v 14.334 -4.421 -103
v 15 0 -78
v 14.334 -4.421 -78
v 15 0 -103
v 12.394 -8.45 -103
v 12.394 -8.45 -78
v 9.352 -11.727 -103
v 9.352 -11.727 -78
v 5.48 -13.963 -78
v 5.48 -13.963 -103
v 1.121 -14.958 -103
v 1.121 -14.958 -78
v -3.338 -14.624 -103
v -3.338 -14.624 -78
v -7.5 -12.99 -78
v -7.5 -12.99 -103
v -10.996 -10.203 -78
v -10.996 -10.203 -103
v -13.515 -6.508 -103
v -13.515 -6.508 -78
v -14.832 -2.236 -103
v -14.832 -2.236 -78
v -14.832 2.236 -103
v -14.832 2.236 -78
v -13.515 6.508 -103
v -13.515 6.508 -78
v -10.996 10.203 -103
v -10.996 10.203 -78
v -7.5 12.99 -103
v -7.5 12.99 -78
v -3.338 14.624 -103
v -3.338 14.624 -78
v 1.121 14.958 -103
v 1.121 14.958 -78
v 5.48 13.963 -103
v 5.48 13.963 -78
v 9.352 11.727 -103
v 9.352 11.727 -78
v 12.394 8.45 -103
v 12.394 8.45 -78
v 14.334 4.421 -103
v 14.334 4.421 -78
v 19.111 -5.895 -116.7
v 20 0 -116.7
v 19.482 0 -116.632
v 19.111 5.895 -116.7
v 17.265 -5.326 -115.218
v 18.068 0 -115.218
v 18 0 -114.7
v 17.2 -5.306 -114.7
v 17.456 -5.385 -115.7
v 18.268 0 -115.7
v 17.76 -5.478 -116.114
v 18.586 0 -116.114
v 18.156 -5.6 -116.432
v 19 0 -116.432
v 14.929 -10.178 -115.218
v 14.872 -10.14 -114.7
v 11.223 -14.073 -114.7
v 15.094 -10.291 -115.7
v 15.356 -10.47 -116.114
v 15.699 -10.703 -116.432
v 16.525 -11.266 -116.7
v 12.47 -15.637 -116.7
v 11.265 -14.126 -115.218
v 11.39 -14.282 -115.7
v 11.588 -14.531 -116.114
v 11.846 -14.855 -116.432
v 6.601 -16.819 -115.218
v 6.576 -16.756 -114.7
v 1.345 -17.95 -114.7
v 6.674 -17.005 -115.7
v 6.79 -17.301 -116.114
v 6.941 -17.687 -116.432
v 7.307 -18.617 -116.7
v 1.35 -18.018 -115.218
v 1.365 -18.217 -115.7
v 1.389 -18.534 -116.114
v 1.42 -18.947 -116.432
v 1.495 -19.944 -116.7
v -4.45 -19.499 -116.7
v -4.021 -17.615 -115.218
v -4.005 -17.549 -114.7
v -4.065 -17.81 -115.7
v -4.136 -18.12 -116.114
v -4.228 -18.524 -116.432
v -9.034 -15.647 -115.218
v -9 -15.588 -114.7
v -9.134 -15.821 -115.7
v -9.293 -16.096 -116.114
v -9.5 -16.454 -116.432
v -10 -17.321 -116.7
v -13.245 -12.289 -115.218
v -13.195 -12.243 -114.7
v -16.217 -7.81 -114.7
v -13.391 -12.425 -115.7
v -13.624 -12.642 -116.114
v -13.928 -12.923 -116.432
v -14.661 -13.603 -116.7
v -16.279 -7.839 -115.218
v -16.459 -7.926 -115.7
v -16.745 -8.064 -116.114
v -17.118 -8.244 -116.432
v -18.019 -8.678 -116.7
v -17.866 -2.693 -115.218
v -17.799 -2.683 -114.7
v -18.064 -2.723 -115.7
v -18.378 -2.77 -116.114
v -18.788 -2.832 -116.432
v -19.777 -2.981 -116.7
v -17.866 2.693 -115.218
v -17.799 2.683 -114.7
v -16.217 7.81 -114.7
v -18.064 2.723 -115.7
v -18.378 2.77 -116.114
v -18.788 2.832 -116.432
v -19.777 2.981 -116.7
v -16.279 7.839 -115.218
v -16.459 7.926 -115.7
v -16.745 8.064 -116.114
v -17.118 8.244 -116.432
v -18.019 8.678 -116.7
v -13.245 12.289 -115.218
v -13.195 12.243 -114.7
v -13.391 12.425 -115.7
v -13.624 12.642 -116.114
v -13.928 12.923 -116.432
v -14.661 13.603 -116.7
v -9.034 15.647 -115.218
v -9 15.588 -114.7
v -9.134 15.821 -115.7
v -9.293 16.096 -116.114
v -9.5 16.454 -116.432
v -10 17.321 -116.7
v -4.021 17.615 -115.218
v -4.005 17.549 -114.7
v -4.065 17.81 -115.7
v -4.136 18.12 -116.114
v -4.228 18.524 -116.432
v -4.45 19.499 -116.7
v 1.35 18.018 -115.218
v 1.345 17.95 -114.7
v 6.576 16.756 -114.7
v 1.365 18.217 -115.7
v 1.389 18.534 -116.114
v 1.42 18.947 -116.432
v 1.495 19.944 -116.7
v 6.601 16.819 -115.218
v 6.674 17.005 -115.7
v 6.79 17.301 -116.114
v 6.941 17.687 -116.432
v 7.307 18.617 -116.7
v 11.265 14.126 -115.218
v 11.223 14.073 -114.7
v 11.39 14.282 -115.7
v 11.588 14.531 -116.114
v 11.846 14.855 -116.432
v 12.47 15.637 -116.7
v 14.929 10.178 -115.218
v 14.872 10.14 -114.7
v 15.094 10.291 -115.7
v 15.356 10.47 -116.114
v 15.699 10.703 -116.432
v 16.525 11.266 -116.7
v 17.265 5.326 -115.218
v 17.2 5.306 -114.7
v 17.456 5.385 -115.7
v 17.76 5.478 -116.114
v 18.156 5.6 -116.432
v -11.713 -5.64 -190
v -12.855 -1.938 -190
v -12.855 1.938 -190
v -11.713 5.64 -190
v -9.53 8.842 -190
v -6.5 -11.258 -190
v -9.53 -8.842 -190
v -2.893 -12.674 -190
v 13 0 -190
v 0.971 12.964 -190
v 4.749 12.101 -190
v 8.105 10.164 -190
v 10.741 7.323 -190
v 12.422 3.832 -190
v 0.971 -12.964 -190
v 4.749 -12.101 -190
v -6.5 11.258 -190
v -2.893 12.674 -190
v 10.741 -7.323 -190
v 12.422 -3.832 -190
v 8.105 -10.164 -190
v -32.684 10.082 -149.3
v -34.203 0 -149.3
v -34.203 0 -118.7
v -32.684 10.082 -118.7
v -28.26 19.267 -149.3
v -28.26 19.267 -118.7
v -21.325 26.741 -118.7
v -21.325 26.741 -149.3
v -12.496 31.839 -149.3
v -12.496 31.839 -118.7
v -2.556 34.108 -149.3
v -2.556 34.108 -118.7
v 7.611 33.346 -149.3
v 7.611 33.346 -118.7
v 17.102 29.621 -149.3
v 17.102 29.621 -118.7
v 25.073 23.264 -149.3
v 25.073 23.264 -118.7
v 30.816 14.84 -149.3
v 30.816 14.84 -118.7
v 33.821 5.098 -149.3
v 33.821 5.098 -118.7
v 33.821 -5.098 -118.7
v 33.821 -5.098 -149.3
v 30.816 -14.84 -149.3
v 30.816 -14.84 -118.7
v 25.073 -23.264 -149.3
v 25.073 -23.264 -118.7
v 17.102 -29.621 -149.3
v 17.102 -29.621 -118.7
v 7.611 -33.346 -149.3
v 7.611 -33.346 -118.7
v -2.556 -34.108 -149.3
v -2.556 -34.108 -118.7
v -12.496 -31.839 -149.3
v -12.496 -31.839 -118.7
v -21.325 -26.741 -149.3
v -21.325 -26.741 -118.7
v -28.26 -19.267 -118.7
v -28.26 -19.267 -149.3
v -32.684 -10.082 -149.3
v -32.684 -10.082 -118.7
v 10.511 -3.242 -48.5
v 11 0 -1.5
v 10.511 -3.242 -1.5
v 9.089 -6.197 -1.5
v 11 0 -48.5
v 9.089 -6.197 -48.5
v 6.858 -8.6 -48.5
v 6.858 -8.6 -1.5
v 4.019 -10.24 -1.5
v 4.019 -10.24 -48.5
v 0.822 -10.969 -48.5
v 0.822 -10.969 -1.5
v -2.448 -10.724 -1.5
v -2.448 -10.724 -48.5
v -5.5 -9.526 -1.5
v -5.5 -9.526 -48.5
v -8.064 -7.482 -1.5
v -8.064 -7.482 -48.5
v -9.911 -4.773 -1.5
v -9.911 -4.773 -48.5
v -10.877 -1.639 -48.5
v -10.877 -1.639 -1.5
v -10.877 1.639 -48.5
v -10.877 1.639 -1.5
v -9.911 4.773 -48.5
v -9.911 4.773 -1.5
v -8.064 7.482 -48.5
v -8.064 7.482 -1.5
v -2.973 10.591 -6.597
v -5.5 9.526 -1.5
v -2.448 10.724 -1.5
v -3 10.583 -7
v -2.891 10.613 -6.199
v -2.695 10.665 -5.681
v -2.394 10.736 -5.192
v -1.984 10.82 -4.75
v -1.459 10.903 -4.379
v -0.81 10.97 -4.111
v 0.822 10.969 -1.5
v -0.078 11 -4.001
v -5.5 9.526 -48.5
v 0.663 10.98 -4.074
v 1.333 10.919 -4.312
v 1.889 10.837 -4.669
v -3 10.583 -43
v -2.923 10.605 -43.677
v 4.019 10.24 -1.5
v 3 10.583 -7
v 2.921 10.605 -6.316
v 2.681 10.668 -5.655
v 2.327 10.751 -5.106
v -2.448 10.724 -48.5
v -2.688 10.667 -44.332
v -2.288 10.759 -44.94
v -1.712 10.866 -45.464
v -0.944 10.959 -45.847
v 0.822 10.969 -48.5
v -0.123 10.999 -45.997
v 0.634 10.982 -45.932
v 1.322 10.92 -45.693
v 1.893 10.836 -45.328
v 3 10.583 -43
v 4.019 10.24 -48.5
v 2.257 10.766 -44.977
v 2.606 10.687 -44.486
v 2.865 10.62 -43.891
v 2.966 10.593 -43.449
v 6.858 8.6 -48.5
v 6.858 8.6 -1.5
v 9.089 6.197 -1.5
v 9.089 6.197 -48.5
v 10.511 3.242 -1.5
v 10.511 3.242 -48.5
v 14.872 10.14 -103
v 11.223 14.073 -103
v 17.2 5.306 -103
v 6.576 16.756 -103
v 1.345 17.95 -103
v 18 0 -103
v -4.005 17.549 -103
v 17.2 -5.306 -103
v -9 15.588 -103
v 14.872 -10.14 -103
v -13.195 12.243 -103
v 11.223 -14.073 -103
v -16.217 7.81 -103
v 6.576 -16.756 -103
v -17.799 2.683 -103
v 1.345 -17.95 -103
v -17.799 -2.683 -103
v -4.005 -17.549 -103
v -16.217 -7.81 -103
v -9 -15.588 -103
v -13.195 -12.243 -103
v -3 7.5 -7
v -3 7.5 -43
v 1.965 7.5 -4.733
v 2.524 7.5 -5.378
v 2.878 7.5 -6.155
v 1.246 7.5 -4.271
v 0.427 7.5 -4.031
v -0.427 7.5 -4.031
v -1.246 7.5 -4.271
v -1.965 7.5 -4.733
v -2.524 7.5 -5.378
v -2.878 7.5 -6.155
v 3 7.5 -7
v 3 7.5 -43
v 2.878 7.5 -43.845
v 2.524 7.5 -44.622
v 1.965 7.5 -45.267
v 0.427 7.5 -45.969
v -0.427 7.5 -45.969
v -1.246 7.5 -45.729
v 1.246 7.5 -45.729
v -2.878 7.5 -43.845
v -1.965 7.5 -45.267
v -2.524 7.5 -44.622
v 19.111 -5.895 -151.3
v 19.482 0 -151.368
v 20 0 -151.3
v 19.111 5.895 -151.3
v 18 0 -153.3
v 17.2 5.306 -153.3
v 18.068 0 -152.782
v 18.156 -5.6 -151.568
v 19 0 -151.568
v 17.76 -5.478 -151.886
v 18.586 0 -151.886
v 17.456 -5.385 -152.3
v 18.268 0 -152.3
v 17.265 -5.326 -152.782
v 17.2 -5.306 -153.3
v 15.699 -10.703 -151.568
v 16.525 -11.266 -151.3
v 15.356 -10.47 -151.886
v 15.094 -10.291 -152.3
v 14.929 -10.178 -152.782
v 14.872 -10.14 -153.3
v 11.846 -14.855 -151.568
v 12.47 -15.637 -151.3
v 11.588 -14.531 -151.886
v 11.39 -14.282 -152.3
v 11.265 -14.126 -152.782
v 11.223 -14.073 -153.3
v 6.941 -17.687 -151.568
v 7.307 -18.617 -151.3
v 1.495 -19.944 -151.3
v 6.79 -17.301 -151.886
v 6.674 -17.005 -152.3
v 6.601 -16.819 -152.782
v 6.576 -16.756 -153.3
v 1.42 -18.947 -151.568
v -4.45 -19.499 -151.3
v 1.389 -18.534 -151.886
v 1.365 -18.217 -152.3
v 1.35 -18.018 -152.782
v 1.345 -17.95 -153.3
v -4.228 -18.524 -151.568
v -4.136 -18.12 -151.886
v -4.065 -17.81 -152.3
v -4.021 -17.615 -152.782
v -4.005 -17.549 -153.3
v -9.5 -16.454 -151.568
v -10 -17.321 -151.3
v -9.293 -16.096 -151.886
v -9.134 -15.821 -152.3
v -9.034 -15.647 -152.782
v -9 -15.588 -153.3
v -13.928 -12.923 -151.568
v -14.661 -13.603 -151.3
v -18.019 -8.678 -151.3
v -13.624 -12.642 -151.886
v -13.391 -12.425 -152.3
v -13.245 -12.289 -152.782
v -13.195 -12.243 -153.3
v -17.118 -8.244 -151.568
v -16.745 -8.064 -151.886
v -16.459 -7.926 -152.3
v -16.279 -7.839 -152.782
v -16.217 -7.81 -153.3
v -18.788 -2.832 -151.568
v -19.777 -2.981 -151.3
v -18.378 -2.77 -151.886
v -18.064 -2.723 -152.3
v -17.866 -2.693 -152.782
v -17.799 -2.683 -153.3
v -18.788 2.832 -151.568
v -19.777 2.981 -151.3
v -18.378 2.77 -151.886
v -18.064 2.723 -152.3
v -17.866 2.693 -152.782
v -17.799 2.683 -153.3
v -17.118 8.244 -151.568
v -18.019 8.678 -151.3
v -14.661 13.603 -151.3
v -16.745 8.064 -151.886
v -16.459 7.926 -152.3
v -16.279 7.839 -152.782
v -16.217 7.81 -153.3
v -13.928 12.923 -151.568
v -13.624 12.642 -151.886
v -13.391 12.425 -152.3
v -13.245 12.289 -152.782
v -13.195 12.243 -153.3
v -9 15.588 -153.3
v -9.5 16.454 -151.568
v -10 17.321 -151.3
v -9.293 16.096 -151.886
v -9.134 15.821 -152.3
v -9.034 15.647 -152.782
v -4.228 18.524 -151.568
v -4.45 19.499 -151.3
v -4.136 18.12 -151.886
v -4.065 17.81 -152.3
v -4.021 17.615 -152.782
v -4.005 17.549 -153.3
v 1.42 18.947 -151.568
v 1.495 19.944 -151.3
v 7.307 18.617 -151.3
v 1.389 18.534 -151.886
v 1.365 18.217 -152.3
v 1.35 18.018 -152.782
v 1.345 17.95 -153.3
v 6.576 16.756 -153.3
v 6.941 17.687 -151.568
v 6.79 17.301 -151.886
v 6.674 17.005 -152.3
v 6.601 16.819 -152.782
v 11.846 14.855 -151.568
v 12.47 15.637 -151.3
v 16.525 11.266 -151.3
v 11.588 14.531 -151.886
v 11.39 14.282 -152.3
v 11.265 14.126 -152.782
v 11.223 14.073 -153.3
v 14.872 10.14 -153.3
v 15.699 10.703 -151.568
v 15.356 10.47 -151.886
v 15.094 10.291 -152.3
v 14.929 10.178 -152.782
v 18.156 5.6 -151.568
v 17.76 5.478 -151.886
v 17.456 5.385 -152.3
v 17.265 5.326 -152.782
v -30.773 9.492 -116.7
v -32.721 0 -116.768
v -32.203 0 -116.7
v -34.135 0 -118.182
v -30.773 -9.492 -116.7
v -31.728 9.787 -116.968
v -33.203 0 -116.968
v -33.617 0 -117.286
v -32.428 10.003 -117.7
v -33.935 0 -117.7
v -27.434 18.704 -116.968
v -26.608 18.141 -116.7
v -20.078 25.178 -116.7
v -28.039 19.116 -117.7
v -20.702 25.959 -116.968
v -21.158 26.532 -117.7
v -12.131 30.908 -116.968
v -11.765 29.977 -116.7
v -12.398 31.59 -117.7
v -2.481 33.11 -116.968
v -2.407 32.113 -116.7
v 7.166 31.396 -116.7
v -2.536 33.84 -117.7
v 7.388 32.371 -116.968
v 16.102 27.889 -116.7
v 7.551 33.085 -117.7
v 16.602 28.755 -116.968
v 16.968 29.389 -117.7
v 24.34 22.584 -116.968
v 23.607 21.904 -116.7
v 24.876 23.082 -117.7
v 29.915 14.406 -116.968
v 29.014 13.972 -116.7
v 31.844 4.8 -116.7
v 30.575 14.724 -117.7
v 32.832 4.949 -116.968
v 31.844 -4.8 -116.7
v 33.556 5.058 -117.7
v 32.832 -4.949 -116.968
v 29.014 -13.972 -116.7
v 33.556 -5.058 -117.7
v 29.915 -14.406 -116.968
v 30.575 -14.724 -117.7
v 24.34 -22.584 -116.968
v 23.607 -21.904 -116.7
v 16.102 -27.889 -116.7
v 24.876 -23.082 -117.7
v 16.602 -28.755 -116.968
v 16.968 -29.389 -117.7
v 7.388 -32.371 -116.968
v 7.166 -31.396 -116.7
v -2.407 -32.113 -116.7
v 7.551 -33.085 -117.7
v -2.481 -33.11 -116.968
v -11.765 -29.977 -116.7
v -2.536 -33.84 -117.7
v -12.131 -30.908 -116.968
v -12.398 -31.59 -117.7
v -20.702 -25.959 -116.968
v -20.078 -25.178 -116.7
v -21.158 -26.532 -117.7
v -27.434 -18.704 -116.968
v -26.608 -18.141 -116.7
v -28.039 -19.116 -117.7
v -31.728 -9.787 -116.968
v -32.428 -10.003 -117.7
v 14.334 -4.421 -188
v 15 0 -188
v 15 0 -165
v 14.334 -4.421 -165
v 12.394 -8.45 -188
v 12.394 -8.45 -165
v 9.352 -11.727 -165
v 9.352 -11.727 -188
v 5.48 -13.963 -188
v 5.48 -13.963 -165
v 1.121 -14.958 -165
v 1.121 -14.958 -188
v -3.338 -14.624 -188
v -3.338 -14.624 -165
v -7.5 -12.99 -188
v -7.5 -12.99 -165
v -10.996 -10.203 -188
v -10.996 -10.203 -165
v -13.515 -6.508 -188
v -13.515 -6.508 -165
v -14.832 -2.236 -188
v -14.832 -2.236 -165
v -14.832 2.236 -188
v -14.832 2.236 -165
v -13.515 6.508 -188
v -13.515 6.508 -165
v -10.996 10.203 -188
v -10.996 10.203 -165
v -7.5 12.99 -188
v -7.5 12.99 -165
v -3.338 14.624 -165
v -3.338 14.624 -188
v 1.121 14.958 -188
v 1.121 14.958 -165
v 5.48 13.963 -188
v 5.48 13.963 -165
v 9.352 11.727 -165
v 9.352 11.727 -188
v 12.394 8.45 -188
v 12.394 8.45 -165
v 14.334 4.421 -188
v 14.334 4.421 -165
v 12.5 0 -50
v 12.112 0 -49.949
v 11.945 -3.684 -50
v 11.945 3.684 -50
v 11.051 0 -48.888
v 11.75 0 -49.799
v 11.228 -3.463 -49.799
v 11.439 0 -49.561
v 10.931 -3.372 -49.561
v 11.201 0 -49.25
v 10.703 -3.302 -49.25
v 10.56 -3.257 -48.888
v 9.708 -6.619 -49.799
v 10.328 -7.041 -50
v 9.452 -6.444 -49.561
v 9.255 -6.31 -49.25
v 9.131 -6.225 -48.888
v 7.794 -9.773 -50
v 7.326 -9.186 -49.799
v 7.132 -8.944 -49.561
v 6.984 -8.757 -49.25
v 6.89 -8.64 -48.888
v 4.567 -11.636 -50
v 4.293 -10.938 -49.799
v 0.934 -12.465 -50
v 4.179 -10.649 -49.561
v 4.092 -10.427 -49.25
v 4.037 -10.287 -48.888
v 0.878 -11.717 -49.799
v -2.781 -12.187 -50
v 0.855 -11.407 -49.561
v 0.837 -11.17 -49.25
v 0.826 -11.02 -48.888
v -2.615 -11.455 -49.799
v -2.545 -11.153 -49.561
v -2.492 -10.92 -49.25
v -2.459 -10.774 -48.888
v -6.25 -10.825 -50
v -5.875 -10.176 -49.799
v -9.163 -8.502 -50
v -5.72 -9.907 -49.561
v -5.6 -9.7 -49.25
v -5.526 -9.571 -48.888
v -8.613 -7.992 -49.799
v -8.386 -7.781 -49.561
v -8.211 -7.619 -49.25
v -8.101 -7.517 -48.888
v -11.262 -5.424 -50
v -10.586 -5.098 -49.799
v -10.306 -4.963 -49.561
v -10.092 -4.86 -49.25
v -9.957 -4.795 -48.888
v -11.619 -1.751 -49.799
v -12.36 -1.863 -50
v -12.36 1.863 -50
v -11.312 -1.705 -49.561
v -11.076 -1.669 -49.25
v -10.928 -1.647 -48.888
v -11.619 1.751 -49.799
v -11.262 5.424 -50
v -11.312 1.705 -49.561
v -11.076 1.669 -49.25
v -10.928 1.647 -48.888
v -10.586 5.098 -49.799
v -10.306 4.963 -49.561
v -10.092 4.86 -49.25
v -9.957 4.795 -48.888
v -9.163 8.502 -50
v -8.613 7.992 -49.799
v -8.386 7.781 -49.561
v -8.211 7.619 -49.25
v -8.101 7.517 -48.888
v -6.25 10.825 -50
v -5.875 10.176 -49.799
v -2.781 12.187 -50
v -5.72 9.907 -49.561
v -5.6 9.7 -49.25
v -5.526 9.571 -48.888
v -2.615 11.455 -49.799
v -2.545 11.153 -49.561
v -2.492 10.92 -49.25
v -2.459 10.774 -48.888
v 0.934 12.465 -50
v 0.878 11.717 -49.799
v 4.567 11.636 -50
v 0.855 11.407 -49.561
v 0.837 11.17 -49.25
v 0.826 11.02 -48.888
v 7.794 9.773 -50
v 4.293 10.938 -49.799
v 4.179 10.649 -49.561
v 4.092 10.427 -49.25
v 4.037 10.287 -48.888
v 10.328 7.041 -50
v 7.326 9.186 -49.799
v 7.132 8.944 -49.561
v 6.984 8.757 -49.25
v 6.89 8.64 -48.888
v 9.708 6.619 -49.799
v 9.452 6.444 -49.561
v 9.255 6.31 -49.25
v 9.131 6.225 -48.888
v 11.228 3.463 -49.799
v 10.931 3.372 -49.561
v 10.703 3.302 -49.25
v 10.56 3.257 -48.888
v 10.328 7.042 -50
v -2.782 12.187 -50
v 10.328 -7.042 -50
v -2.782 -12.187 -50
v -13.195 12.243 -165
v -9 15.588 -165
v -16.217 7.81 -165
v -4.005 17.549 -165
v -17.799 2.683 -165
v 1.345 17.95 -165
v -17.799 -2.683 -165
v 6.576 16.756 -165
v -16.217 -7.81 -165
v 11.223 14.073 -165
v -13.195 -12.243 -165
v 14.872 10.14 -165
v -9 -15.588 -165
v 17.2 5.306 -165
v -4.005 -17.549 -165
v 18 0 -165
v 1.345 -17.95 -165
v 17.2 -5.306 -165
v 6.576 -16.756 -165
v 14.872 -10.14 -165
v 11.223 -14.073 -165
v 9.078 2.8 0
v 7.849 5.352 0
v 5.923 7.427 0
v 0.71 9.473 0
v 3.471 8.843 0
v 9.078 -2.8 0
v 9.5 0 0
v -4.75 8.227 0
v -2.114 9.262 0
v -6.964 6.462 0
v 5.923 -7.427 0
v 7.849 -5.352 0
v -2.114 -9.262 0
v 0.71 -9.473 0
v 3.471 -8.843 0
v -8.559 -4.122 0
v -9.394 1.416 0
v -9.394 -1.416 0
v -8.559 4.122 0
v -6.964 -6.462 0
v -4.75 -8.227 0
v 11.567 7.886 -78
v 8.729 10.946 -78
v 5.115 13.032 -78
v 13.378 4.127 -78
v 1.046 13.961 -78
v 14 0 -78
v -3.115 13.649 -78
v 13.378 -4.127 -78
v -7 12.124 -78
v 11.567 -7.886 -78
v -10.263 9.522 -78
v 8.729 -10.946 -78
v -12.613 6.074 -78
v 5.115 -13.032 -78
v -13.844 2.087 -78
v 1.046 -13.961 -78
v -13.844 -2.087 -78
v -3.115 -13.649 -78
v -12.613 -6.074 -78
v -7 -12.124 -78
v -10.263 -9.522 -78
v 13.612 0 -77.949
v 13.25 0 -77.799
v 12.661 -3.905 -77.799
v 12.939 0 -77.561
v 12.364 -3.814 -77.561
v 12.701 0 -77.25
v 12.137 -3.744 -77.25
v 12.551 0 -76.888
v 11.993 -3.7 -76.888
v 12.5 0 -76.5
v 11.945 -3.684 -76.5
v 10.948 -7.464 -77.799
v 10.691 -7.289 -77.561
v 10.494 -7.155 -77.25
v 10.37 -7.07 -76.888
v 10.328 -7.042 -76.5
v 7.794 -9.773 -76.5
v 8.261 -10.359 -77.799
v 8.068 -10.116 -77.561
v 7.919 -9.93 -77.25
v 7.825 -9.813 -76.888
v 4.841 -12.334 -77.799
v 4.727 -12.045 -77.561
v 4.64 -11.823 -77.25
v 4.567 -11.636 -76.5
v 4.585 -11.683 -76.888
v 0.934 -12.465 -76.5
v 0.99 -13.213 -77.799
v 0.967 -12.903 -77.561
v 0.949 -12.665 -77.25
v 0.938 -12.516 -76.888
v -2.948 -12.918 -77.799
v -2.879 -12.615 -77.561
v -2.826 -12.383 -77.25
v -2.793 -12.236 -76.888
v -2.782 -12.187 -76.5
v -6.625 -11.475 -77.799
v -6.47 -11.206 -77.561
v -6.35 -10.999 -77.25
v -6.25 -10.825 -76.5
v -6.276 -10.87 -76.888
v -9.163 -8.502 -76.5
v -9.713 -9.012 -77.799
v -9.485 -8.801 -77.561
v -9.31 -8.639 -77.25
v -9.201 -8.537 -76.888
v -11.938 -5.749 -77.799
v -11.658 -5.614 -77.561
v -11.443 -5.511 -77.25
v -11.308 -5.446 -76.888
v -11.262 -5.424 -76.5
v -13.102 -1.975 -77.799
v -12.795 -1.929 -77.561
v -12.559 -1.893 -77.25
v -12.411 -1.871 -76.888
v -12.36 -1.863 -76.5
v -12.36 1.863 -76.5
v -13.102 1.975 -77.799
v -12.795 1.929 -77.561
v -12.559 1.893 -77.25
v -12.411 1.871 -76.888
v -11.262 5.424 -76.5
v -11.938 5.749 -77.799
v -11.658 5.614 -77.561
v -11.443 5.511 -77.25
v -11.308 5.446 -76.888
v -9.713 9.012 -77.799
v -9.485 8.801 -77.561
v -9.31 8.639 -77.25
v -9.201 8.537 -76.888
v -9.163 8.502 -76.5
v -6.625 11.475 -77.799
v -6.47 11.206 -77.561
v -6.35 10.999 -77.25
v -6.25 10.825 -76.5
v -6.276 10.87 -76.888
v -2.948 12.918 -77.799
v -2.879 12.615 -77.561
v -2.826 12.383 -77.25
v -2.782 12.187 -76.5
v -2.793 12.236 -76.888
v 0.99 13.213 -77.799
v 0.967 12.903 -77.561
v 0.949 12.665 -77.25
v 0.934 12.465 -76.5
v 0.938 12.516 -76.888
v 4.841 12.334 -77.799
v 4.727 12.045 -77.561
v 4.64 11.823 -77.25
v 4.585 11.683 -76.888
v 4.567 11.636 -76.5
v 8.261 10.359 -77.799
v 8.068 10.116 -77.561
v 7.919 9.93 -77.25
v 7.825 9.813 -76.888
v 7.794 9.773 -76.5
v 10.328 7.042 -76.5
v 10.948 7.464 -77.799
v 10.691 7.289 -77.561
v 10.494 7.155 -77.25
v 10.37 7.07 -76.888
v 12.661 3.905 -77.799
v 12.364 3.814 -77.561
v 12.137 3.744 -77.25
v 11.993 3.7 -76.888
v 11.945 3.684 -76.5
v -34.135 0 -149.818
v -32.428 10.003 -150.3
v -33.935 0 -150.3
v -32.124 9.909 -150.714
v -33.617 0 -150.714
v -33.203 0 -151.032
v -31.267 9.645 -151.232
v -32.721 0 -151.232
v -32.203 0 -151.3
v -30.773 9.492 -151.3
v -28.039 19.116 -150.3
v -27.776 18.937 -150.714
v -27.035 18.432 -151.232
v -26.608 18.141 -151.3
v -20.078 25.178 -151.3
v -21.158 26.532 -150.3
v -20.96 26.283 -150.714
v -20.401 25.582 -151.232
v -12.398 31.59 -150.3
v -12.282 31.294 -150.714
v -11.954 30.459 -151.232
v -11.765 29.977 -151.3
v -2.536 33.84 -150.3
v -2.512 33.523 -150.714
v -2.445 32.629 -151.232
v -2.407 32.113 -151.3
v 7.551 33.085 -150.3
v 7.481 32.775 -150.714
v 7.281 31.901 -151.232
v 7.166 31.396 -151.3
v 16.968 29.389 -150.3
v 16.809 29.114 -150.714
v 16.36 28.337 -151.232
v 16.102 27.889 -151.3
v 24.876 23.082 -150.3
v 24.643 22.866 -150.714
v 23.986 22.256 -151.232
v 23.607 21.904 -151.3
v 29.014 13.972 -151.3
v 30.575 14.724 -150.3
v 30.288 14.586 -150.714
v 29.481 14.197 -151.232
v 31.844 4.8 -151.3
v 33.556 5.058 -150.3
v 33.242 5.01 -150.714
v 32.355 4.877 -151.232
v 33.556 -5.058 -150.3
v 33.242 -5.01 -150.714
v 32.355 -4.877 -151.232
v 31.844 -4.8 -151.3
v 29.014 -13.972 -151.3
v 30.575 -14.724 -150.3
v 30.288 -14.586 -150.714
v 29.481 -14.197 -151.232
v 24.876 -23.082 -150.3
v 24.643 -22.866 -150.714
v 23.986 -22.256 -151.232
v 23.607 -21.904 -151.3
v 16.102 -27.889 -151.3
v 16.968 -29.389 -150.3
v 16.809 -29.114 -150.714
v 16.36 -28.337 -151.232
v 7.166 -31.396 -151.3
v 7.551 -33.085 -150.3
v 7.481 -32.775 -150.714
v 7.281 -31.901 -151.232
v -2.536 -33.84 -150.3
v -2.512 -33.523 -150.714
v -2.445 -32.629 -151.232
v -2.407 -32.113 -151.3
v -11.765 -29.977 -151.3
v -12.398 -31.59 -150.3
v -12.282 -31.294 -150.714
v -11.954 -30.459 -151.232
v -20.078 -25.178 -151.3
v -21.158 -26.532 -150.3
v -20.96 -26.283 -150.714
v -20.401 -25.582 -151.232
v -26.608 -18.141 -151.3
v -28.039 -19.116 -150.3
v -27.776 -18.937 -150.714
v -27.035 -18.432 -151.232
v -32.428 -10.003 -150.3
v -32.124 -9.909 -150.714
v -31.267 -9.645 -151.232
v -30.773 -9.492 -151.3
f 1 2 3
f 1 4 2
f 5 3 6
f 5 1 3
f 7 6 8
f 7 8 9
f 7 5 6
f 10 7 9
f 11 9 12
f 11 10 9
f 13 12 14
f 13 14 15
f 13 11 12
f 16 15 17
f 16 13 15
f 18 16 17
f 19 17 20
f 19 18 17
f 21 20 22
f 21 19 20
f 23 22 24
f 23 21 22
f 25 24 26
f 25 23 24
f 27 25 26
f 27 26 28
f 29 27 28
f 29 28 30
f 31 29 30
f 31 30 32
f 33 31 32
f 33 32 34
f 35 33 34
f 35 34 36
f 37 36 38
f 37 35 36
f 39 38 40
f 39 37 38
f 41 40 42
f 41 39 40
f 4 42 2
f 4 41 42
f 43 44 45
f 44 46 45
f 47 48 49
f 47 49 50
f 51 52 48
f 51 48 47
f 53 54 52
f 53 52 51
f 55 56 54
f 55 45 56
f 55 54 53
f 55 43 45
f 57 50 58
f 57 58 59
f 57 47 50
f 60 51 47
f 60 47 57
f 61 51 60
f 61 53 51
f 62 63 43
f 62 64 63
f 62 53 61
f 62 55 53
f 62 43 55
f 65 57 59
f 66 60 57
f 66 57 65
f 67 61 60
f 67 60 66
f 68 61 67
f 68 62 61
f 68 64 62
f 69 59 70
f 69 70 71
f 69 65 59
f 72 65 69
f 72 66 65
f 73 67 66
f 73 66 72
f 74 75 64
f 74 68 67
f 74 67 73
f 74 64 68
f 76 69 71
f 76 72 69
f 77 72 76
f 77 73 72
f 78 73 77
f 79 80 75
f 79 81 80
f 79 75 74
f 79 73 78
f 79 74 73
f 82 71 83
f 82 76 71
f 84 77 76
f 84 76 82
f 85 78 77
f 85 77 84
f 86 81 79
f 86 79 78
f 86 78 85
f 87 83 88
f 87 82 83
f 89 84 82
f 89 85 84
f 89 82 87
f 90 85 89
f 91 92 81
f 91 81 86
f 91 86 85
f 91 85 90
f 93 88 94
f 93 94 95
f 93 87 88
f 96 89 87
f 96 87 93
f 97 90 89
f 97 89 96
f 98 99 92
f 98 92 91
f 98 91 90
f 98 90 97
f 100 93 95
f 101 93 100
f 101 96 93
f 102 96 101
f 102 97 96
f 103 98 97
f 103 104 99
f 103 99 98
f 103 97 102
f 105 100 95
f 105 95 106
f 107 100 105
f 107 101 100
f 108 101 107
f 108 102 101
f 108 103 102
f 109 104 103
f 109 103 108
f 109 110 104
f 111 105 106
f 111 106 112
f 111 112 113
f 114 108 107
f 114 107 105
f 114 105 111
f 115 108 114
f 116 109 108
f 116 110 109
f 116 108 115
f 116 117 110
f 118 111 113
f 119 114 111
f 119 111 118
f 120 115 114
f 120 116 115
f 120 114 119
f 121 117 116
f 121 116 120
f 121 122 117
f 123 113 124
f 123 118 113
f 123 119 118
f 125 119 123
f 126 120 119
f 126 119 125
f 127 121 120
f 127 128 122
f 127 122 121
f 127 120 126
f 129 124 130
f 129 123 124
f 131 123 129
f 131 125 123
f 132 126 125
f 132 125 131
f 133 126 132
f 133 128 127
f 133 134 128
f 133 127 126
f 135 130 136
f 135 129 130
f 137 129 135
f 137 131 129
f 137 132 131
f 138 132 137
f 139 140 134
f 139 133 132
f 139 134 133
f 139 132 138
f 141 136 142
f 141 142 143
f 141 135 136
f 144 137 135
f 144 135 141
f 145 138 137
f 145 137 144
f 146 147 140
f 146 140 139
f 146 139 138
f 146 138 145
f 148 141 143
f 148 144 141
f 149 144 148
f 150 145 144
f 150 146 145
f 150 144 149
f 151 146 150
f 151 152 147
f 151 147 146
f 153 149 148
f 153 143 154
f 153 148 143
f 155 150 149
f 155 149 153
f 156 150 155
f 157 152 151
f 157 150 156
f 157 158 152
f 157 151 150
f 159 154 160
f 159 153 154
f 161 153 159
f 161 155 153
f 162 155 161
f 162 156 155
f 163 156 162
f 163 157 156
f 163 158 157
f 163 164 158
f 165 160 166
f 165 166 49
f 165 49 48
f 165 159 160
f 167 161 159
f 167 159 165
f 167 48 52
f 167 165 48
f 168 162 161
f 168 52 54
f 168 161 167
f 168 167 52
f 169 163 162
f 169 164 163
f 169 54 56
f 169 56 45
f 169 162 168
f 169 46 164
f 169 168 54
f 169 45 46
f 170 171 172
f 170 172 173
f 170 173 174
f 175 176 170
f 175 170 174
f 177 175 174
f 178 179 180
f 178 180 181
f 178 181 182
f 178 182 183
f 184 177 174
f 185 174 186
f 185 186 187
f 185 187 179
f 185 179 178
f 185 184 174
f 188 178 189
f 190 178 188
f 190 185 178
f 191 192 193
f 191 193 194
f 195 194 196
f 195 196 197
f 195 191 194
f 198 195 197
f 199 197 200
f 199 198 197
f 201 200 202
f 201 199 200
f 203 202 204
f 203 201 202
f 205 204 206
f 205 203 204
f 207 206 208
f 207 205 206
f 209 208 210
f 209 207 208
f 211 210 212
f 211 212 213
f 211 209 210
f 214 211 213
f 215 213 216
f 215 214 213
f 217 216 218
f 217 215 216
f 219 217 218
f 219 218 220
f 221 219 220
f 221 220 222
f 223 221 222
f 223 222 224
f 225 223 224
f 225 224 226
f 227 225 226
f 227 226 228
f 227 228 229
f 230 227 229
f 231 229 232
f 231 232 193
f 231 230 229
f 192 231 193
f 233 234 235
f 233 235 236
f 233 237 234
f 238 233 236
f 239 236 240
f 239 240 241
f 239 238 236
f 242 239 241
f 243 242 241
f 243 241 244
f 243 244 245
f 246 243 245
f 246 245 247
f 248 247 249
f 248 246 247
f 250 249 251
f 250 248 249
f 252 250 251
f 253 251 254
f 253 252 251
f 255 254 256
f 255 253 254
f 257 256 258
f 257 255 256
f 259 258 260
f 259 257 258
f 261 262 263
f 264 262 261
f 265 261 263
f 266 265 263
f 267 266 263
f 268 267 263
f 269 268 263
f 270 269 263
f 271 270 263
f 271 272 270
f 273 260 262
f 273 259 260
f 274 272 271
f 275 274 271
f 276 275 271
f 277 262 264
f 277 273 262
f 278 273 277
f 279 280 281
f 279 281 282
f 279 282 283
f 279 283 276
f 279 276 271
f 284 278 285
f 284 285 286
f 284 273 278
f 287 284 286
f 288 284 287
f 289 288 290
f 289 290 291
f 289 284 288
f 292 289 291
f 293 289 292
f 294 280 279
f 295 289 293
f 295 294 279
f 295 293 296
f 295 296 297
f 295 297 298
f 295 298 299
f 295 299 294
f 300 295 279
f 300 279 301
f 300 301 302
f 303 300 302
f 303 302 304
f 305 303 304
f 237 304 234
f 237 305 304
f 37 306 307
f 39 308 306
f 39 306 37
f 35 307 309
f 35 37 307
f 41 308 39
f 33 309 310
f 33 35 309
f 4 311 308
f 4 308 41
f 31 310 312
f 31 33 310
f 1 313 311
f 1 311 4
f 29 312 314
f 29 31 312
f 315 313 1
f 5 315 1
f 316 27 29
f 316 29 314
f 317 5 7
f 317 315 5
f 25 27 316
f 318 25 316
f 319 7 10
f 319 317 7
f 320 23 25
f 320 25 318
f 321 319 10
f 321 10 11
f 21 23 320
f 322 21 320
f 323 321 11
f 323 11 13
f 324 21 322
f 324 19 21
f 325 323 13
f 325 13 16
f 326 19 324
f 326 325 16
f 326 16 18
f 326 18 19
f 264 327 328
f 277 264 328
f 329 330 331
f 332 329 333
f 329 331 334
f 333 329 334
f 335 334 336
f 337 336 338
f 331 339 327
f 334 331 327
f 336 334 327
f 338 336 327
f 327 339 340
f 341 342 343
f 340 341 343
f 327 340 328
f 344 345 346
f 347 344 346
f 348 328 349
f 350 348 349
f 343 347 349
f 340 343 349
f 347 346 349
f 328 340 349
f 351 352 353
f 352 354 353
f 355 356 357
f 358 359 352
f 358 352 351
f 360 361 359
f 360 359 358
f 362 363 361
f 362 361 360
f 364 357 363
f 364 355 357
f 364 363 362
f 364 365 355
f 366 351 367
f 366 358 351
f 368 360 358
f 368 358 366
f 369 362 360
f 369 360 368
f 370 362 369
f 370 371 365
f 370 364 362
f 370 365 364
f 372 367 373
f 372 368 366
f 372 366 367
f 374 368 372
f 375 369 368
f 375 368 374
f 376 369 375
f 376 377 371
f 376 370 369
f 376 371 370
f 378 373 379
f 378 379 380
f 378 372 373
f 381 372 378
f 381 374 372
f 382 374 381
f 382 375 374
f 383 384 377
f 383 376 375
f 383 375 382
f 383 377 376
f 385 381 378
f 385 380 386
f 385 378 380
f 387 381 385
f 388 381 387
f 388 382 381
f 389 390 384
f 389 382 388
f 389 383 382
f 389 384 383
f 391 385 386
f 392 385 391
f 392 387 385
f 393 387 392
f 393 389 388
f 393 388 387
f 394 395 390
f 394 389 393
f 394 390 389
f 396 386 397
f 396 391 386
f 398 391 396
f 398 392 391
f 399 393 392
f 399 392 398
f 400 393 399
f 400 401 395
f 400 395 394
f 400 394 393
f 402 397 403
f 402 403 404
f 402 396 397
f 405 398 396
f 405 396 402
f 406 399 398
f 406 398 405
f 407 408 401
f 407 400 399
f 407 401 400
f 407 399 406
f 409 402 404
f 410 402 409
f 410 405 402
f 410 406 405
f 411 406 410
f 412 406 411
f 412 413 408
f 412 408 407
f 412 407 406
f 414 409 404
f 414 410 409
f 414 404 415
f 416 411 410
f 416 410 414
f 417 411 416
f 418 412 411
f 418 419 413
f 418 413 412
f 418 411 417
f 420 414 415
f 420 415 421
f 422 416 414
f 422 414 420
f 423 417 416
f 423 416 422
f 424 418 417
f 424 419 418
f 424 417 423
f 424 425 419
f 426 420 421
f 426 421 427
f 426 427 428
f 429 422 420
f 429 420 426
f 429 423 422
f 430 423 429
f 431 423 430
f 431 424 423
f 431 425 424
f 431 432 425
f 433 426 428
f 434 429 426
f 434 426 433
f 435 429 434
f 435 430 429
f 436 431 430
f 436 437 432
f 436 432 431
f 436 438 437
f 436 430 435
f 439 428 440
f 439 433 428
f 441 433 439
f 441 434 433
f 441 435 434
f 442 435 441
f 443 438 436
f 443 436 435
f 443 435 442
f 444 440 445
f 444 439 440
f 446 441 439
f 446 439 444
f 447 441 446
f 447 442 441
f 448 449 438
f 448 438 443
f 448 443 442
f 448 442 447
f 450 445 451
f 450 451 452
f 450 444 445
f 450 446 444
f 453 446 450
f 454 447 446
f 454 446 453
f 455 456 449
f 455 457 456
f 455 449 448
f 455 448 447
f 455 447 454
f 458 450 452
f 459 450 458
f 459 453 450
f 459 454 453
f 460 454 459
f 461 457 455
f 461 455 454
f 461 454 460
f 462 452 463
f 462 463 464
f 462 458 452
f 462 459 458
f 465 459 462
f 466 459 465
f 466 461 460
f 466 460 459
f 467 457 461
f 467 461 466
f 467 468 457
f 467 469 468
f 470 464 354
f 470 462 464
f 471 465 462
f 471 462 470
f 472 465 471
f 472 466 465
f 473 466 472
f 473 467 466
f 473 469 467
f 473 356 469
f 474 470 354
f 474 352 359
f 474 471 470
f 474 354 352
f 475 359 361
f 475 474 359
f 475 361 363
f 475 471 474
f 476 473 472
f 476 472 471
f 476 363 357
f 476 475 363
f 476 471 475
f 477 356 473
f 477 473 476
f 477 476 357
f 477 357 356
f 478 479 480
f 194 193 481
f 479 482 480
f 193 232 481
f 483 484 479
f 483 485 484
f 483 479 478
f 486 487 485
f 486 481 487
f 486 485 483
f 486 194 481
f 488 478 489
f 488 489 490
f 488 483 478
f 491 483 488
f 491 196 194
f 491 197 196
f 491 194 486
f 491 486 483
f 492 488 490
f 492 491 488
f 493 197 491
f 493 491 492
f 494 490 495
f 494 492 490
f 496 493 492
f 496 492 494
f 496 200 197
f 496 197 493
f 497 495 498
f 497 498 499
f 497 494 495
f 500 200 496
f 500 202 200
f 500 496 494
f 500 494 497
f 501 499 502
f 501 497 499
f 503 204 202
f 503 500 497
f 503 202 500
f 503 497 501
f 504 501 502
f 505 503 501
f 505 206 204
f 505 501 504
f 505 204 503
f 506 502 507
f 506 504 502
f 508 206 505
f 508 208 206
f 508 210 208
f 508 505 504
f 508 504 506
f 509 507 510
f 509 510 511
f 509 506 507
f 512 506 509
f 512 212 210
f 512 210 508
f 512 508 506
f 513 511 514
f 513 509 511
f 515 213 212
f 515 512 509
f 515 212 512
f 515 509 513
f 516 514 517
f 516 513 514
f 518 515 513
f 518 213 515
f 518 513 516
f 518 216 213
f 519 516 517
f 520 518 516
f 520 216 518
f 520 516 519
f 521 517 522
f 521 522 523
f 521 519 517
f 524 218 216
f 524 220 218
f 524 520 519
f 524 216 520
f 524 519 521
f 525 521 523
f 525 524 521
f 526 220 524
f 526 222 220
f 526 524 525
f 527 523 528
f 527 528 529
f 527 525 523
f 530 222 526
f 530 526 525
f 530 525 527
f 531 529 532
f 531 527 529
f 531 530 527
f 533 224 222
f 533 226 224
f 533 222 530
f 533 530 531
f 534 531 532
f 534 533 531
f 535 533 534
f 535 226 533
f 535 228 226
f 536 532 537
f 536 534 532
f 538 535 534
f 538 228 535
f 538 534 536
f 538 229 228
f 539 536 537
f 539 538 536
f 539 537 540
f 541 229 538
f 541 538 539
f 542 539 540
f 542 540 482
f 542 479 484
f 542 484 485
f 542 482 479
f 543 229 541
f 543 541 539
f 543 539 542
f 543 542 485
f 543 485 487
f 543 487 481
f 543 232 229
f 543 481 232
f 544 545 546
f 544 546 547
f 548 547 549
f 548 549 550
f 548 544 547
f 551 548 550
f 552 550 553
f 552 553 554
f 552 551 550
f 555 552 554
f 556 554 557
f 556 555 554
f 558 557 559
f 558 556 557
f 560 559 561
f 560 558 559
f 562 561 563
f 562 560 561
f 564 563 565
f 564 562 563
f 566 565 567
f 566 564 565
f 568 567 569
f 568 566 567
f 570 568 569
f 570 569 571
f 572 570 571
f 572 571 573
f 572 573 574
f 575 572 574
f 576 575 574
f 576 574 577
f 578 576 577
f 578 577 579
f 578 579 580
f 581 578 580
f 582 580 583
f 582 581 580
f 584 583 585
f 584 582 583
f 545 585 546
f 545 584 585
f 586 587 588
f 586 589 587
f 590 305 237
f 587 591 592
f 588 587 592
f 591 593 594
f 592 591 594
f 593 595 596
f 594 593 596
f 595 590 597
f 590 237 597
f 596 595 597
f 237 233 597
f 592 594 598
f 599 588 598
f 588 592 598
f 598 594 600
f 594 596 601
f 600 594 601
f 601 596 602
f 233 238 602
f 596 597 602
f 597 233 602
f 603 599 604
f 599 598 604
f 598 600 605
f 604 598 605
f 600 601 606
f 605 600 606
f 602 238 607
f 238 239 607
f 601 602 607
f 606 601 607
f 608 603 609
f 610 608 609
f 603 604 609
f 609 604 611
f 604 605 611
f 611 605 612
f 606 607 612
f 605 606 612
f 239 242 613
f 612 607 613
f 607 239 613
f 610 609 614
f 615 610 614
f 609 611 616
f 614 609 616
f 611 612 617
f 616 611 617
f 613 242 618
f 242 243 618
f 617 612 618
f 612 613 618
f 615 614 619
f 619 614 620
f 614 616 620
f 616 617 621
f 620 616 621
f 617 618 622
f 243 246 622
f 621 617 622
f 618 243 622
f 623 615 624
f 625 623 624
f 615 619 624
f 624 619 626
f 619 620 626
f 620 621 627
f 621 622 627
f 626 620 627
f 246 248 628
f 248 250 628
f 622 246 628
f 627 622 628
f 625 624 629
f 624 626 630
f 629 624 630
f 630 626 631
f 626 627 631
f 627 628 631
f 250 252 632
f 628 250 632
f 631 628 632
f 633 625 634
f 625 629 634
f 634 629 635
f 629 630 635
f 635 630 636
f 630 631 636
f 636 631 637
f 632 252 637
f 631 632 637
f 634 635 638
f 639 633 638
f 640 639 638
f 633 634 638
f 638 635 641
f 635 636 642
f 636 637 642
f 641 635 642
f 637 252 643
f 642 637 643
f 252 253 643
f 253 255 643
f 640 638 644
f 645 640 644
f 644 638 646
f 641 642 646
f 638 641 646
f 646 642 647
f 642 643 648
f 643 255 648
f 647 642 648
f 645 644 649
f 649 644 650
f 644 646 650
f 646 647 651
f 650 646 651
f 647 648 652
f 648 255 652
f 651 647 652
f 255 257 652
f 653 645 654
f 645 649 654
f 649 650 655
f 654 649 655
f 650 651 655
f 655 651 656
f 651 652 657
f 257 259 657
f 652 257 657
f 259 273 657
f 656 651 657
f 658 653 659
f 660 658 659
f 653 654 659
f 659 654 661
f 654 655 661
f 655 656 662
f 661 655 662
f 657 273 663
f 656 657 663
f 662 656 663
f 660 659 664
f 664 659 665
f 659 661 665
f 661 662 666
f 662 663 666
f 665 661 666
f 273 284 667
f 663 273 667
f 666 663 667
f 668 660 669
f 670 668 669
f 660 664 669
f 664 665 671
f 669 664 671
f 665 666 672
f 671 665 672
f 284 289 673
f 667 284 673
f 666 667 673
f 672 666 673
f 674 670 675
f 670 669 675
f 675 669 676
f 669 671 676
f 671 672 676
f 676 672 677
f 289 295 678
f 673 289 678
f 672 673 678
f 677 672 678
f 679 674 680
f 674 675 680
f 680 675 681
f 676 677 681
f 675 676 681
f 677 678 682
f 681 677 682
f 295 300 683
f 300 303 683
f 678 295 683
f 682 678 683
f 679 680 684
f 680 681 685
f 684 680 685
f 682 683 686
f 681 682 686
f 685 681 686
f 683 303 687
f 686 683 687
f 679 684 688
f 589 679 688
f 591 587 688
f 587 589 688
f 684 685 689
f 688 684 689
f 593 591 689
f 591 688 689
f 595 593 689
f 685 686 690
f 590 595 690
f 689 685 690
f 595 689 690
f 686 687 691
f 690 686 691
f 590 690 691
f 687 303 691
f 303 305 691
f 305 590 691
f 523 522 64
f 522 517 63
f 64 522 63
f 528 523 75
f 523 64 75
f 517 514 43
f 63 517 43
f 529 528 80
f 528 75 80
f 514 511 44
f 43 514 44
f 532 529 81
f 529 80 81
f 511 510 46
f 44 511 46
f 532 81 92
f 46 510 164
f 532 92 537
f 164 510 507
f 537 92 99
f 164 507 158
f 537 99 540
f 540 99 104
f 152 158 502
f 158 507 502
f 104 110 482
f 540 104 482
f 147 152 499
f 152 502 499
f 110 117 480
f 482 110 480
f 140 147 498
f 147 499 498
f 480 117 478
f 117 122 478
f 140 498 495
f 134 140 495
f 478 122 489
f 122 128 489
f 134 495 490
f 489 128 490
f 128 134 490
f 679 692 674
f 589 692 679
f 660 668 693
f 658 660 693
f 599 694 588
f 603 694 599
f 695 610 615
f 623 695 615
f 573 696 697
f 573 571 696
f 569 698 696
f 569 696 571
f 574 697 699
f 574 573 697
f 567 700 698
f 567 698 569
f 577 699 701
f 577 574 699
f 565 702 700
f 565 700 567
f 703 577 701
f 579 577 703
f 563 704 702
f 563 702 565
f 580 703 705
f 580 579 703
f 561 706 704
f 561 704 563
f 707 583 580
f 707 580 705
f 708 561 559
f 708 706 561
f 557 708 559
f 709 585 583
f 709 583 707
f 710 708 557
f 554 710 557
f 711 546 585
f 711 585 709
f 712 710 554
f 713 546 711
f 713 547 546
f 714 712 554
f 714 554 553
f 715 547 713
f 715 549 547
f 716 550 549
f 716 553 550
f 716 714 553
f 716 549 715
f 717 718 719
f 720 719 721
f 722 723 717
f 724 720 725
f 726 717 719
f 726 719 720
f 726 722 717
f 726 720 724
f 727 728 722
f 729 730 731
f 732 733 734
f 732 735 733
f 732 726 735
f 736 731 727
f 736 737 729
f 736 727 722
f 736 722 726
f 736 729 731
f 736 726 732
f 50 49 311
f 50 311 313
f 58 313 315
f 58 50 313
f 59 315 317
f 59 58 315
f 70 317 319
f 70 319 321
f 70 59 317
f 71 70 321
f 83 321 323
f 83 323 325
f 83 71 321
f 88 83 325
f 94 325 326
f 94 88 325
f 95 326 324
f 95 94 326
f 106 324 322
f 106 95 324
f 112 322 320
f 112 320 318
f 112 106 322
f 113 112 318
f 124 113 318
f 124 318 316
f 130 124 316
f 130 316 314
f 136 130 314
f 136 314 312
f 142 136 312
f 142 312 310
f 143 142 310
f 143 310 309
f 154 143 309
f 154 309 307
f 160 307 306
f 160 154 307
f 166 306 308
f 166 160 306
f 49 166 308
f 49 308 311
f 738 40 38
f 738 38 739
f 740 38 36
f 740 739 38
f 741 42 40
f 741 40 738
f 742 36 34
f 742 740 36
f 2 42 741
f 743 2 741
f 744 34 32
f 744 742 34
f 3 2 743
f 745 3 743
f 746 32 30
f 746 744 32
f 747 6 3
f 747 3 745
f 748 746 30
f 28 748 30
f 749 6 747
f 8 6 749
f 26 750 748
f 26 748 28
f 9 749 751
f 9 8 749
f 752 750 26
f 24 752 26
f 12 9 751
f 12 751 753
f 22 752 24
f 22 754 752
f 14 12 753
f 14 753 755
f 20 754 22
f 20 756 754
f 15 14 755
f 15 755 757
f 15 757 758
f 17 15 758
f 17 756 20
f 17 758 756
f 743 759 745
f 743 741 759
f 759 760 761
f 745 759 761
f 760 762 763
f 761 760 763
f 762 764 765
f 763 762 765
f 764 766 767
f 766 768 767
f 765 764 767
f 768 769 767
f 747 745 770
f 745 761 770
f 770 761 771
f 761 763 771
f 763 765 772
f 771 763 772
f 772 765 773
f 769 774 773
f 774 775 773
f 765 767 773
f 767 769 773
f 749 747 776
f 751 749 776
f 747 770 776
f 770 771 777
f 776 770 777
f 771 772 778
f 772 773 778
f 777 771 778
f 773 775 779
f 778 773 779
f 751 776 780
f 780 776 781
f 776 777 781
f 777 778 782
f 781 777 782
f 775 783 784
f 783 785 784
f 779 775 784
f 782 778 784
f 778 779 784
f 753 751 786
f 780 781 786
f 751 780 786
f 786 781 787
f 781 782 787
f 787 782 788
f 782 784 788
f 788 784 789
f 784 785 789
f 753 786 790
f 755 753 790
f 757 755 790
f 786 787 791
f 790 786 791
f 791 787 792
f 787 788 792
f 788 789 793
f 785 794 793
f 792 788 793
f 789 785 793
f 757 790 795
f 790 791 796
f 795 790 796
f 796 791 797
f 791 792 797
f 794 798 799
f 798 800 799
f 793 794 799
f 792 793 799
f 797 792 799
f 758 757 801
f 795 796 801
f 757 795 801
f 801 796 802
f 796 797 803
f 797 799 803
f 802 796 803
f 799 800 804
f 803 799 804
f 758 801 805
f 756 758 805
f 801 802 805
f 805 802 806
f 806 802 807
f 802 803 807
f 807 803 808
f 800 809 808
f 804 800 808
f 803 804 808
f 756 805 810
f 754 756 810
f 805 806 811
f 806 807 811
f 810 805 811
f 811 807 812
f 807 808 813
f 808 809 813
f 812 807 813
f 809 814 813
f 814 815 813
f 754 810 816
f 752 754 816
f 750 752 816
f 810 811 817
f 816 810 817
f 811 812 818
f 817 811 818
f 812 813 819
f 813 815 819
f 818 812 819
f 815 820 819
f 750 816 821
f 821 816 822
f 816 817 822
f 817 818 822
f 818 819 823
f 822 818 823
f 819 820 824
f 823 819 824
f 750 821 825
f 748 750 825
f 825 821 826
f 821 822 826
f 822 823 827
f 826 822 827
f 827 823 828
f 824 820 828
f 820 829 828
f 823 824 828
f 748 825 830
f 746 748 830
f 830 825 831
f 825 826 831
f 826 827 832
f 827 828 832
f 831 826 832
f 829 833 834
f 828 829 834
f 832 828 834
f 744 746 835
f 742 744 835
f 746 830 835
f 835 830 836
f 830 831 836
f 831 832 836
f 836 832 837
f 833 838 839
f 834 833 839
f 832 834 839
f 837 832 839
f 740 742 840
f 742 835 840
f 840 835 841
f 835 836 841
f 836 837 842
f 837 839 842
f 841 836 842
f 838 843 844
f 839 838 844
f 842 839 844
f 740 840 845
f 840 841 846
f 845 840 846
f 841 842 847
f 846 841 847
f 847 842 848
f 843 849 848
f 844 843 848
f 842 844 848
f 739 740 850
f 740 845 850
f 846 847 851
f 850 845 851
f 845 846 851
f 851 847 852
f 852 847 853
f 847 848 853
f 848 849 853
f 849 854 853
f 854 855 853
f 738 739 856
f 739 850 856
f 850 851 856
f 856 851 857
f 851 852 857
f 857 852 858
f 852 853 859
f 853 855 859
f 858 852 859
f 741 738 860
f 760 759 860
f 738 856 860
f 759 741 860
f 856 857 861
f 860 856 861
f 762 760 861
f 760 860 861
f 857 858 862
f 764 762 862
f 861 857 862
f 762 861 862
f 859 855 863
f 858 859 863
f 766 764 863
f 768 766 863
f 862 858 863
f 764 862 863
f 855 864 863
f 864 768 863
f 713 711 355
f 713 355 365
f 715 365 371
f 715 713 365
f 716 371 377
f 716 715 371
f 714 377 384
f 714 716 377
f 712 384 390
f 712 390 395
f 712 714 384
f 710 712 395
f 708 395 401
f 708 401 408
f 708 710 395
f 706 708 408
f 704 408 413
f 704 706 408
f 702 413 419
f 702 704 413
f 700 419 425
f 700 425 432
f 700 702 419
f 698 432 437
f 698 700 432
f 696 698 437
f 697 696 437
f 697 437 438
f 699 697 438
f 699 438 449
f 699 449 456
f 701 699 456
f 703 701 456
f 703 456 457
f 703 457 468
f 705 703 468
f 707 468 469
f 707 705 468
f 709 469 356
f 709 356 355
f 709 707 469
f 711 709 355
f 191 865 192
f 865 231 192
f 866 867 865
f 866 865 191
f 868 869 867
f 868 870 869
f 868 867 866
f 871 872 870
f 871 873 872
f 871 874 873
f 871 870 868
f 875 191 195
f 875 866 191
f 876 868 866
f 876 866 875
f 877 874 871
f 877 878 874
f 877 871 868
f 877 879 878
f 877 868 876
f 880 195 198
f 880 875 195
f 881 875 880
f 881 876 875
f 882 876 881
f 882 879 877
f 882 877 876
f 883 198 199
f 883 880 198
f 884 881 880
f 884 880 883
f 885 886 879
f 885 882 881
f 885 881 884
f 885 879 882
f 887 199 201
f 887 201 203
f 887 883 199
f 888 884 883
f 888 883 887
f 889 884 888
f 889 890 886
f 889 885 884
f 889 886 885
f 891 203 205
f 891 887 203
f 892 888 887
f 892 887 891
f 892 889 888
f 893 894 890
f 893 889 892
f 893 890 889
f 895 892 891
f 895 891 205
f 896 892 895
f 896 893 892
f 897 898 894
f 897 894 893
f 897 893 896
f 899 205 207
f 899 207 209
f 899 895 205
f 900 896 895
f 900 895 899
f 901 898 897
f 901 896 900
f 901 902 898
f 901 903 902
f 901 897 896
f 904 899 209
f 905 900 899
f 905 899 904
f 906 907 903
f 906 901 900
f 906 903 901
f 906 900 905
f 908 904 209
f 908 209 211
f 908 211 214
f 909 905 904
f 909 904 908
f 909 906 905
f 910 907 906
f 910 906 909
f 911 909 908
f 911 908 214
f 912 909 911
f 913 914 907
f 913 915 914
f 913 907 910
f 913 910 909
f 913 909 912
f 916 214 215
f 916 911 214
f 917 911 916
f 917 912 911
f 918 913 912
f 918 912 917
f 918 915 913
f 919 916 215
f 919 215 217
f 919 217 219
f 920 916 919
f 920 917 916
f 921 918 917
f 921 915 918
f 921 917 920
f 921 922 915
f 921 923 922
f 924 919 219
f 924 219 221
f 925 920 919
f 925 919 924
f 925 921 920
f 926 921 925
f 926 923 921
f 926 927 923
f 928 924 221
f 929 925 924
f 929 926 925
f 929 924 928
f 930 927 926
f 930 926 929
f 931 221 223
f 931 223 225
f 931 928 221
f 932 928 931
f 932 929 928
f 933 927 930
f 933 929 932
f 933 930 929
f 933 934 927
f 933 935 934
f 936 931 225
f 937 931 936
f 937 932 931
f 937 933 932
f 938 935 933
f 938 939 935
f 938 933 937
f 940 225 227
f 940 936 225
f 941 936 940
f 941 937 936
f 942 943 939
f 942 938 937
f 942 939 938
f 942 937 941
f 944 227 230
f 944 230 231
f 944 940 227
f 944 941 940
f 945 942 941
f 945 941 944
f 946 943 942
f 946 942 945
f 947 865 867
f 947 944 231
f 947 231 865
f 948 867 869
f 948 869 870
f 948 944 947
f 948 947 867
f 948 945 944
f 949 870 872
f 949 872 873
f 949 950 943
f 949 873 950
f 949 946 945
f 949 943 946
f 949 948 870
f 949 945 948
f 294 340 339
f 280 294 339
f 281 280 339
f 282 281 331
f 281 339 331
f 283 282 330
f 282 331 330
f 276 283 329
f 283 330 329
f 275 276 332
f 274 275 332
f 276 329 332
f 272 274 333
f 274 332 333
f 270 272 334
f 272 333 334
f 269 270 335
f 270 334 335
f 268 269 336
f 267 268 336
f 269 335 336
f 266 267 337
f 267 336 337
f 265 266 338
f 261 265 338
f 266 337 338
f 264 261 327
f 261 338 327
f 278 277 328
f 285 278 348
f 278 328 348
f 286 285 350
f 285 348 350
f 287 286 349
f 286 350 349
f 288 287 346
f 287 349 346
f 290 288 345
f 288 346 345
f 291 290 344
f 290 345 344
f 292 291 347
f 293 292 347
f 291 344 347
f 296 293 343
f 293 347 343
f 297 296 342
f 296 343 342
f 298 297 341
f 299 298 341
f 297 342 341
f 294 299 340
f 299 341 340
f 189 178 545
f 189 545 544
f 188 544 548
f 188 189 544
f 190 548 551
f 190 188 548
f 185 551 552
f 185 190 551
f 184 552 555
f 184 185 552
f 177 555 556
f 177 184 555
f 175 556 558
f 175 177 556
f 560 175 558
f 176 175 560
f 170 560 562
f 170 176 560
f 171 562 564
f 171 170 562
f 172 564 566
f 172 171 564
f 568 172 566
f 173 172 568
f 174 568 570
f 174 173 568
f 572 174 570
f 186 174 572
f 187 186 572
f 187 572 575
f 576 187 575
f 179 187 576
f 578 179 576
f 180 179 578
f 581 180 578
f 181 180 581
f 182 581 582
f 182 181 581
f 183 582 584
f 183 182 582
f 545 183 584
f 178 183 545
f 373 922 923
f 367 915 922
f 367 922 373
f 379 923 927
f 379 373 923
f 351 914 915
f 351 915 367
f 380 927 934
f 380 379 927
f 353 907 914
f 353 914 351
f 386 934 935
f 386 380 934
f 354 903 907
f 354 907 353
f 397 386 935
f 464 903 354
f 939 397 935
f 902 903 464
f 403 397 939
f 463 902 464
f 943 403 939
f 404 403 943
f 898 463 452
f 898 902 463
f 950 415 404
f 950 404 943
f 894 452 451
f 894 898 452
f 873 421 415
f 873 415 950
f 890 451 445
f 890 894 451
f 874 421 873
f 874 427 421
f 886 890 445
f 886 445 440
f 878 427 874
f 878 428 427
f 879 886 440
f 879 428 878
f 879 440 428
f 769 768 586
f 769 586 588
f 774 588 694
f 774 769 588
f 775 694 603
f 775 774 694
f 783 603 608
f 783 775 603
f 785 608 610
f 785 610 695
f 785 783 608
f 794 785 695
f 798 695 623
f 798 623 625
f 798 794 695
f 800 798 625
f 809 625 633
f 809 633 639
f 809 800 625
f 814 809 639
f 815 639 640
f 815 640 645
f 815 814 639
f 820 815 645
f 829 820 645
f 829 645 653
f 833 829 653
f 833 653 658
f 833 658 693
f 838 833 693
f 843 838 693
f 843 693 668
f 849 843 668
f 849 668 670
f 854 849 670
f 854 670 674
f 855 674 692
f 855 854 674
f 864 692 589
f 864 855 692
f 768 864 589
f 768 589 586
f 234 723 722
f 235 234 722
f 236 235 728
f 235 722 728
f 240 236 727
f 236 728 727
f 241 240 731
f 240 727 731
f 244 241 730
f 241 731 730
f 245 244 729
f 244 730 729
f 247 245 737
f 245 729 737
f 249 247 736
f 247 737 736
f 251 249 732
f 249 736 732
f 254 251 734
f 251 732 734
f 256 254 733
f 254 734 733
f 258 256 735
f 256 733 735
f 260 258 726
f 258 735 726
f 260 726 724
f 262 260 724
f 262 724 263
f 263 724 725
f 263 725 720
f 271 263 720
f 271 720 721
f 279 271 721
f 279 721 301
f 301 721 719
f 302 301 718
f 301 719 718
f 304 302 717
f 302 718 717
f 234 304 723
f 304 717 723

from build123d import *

# Parameters (mm, degrees)
SKETCH3_R               = 34.2032822
BOSS_EXTRUDE1_DEPTH     = 34.6
FILLET1_R               = 1.5
FILLET2_R               = 2
CHAMFER2_SIZE           = 1.5
CHAMFER3_SIZE           = 2
SKETCH4_R               = 29.8214615
DF1_DEPTH               = 34.6
FILLET3_R               = 2
CUT_EXTRUDE1_REACH      = 199.507
CUT_EXTRUDE1_END_RADIUS = 11


with BuildPart() as part:
    # Sketch2 → Revolve1 (revolve)
    with BuildSketch(Plane(origin=(0, 0, 0), x_dir=(0, 0, -1), z_dir=(1, 0, 0)), mode=Mode.PRIVATE) as revolve1_sk:
        Polygon((0, 0), (0, 11), (50, 11), (50, 12.5), (78, 12.5), (78, 15), (103, 15), (103, 18), (165, 18), (165, 15), (190, 15), (190, 0), align=None)
    revolve(revolve1_sk.sketch.rotate(Axis((0, 0, 0), (0, 0, -1)), 90), axis=Axis((0, 0, 0), (0, 0, -1)))

    # Sketch3 → Boss-Extrude1 (add)
    with BuildSketch(Plane(origin=(0, 0, -151.3), x_dir=(-1, 0, 0), z_dir=(0, 0, -1))):
        Circle(SKETCH3_R)
    extrude(amount=-BOSS_EXTRUDE1_DEPTH)

    # Fillet1
    fillet1_edges = [part.edges().sort_by_distance(p)[0] for p in [
        (-12.5, 0, -78),
        (-11, 0, -50),
    ]]
    fillet(fillet1_edges, radius=FILLET1_R - 0.0001)  # a hair under: the kernel refuses the full size

    # Fillet2
    fillet2_edges = [part.edges().sort_by_distance(p)[0] for p in [
        (-18, 0, -116.7),
        (-18, 0, -151.3),
    ]]
    fillet(fillet2_edges, radius=FILLET2_R)

    # Chamfer2
    chamfer2_edges = [part.edges().sort_by_distance(p)[0] for p in [
        (-11, 0, 0),
    ]]
    chamfer(chamfer2_edges, length=CHAMFER2_SIZE)

    # Chamfer3
    chamfer3_edges = [part.edges().sort_by_distance(p)[0] for p in [
        (-15, 0, -190),
    ]]
    chamfer(chamfer3_edges, length=CHAMFER3_SIZE)

    # Sketch4 → df1 (add)
    with BuildSketch(Plane.XY.offset(-116.7)):
        Circle(SKETCH4_R)
    extrude(amount=-DF1_DEPTH)

    # Fillet3
    fillet3_edges = [part.edges().sort_by_distance(p)[0] for p in [
        (34.2032822, 0, -116.7),
        (34.2032822, 0, -151.3),
    ]]
    fillet(fillet3_edges, radius=FILLET3_R)

    # Cut-Extrude1: up to this cylinder (the profile starts inside it)
    cut_extrude1_end = Plane(origin=(0, 0, -25), z_dir=(0, 0, 1)) * Cylinder(CUT_EXTRUDE1_END_RADIUS, 422.014, mode=Mode.PRIVATE)
    # Sketch5 → Cut-Extrude1 (cut, up to the surface)
    with BuildSketch(Plane(origin=(0, 7.5, 0), x_dir=(1, 0, 0), z_dir=(0, 1, 0)), mode=Mode.PRIVATE) as cut_extrude1_sk1:
        with BuildLine():
            Line((3, 43), (3, 7))
            ThreePointArc((3, 7), (0, 4), (-3, 7))
            Line((-3, 7), (-3, 43))
            ThreePointArc((-3, 43), (0, 46), (3, 43))
        make_face()
    cut_extrude1_tool1 = extrude(cut_extrude1_sk1.sketch, amount=CUT_EXTRUDE1_REACH, mode=Mode.PRIVATE) & cut_extrude1_end
    add(cut_extrude1_tool1.solids().sort_by_distance((0, 7.5, -25))[0], mode=Mode.SUBTRACT)


solid = part.part
